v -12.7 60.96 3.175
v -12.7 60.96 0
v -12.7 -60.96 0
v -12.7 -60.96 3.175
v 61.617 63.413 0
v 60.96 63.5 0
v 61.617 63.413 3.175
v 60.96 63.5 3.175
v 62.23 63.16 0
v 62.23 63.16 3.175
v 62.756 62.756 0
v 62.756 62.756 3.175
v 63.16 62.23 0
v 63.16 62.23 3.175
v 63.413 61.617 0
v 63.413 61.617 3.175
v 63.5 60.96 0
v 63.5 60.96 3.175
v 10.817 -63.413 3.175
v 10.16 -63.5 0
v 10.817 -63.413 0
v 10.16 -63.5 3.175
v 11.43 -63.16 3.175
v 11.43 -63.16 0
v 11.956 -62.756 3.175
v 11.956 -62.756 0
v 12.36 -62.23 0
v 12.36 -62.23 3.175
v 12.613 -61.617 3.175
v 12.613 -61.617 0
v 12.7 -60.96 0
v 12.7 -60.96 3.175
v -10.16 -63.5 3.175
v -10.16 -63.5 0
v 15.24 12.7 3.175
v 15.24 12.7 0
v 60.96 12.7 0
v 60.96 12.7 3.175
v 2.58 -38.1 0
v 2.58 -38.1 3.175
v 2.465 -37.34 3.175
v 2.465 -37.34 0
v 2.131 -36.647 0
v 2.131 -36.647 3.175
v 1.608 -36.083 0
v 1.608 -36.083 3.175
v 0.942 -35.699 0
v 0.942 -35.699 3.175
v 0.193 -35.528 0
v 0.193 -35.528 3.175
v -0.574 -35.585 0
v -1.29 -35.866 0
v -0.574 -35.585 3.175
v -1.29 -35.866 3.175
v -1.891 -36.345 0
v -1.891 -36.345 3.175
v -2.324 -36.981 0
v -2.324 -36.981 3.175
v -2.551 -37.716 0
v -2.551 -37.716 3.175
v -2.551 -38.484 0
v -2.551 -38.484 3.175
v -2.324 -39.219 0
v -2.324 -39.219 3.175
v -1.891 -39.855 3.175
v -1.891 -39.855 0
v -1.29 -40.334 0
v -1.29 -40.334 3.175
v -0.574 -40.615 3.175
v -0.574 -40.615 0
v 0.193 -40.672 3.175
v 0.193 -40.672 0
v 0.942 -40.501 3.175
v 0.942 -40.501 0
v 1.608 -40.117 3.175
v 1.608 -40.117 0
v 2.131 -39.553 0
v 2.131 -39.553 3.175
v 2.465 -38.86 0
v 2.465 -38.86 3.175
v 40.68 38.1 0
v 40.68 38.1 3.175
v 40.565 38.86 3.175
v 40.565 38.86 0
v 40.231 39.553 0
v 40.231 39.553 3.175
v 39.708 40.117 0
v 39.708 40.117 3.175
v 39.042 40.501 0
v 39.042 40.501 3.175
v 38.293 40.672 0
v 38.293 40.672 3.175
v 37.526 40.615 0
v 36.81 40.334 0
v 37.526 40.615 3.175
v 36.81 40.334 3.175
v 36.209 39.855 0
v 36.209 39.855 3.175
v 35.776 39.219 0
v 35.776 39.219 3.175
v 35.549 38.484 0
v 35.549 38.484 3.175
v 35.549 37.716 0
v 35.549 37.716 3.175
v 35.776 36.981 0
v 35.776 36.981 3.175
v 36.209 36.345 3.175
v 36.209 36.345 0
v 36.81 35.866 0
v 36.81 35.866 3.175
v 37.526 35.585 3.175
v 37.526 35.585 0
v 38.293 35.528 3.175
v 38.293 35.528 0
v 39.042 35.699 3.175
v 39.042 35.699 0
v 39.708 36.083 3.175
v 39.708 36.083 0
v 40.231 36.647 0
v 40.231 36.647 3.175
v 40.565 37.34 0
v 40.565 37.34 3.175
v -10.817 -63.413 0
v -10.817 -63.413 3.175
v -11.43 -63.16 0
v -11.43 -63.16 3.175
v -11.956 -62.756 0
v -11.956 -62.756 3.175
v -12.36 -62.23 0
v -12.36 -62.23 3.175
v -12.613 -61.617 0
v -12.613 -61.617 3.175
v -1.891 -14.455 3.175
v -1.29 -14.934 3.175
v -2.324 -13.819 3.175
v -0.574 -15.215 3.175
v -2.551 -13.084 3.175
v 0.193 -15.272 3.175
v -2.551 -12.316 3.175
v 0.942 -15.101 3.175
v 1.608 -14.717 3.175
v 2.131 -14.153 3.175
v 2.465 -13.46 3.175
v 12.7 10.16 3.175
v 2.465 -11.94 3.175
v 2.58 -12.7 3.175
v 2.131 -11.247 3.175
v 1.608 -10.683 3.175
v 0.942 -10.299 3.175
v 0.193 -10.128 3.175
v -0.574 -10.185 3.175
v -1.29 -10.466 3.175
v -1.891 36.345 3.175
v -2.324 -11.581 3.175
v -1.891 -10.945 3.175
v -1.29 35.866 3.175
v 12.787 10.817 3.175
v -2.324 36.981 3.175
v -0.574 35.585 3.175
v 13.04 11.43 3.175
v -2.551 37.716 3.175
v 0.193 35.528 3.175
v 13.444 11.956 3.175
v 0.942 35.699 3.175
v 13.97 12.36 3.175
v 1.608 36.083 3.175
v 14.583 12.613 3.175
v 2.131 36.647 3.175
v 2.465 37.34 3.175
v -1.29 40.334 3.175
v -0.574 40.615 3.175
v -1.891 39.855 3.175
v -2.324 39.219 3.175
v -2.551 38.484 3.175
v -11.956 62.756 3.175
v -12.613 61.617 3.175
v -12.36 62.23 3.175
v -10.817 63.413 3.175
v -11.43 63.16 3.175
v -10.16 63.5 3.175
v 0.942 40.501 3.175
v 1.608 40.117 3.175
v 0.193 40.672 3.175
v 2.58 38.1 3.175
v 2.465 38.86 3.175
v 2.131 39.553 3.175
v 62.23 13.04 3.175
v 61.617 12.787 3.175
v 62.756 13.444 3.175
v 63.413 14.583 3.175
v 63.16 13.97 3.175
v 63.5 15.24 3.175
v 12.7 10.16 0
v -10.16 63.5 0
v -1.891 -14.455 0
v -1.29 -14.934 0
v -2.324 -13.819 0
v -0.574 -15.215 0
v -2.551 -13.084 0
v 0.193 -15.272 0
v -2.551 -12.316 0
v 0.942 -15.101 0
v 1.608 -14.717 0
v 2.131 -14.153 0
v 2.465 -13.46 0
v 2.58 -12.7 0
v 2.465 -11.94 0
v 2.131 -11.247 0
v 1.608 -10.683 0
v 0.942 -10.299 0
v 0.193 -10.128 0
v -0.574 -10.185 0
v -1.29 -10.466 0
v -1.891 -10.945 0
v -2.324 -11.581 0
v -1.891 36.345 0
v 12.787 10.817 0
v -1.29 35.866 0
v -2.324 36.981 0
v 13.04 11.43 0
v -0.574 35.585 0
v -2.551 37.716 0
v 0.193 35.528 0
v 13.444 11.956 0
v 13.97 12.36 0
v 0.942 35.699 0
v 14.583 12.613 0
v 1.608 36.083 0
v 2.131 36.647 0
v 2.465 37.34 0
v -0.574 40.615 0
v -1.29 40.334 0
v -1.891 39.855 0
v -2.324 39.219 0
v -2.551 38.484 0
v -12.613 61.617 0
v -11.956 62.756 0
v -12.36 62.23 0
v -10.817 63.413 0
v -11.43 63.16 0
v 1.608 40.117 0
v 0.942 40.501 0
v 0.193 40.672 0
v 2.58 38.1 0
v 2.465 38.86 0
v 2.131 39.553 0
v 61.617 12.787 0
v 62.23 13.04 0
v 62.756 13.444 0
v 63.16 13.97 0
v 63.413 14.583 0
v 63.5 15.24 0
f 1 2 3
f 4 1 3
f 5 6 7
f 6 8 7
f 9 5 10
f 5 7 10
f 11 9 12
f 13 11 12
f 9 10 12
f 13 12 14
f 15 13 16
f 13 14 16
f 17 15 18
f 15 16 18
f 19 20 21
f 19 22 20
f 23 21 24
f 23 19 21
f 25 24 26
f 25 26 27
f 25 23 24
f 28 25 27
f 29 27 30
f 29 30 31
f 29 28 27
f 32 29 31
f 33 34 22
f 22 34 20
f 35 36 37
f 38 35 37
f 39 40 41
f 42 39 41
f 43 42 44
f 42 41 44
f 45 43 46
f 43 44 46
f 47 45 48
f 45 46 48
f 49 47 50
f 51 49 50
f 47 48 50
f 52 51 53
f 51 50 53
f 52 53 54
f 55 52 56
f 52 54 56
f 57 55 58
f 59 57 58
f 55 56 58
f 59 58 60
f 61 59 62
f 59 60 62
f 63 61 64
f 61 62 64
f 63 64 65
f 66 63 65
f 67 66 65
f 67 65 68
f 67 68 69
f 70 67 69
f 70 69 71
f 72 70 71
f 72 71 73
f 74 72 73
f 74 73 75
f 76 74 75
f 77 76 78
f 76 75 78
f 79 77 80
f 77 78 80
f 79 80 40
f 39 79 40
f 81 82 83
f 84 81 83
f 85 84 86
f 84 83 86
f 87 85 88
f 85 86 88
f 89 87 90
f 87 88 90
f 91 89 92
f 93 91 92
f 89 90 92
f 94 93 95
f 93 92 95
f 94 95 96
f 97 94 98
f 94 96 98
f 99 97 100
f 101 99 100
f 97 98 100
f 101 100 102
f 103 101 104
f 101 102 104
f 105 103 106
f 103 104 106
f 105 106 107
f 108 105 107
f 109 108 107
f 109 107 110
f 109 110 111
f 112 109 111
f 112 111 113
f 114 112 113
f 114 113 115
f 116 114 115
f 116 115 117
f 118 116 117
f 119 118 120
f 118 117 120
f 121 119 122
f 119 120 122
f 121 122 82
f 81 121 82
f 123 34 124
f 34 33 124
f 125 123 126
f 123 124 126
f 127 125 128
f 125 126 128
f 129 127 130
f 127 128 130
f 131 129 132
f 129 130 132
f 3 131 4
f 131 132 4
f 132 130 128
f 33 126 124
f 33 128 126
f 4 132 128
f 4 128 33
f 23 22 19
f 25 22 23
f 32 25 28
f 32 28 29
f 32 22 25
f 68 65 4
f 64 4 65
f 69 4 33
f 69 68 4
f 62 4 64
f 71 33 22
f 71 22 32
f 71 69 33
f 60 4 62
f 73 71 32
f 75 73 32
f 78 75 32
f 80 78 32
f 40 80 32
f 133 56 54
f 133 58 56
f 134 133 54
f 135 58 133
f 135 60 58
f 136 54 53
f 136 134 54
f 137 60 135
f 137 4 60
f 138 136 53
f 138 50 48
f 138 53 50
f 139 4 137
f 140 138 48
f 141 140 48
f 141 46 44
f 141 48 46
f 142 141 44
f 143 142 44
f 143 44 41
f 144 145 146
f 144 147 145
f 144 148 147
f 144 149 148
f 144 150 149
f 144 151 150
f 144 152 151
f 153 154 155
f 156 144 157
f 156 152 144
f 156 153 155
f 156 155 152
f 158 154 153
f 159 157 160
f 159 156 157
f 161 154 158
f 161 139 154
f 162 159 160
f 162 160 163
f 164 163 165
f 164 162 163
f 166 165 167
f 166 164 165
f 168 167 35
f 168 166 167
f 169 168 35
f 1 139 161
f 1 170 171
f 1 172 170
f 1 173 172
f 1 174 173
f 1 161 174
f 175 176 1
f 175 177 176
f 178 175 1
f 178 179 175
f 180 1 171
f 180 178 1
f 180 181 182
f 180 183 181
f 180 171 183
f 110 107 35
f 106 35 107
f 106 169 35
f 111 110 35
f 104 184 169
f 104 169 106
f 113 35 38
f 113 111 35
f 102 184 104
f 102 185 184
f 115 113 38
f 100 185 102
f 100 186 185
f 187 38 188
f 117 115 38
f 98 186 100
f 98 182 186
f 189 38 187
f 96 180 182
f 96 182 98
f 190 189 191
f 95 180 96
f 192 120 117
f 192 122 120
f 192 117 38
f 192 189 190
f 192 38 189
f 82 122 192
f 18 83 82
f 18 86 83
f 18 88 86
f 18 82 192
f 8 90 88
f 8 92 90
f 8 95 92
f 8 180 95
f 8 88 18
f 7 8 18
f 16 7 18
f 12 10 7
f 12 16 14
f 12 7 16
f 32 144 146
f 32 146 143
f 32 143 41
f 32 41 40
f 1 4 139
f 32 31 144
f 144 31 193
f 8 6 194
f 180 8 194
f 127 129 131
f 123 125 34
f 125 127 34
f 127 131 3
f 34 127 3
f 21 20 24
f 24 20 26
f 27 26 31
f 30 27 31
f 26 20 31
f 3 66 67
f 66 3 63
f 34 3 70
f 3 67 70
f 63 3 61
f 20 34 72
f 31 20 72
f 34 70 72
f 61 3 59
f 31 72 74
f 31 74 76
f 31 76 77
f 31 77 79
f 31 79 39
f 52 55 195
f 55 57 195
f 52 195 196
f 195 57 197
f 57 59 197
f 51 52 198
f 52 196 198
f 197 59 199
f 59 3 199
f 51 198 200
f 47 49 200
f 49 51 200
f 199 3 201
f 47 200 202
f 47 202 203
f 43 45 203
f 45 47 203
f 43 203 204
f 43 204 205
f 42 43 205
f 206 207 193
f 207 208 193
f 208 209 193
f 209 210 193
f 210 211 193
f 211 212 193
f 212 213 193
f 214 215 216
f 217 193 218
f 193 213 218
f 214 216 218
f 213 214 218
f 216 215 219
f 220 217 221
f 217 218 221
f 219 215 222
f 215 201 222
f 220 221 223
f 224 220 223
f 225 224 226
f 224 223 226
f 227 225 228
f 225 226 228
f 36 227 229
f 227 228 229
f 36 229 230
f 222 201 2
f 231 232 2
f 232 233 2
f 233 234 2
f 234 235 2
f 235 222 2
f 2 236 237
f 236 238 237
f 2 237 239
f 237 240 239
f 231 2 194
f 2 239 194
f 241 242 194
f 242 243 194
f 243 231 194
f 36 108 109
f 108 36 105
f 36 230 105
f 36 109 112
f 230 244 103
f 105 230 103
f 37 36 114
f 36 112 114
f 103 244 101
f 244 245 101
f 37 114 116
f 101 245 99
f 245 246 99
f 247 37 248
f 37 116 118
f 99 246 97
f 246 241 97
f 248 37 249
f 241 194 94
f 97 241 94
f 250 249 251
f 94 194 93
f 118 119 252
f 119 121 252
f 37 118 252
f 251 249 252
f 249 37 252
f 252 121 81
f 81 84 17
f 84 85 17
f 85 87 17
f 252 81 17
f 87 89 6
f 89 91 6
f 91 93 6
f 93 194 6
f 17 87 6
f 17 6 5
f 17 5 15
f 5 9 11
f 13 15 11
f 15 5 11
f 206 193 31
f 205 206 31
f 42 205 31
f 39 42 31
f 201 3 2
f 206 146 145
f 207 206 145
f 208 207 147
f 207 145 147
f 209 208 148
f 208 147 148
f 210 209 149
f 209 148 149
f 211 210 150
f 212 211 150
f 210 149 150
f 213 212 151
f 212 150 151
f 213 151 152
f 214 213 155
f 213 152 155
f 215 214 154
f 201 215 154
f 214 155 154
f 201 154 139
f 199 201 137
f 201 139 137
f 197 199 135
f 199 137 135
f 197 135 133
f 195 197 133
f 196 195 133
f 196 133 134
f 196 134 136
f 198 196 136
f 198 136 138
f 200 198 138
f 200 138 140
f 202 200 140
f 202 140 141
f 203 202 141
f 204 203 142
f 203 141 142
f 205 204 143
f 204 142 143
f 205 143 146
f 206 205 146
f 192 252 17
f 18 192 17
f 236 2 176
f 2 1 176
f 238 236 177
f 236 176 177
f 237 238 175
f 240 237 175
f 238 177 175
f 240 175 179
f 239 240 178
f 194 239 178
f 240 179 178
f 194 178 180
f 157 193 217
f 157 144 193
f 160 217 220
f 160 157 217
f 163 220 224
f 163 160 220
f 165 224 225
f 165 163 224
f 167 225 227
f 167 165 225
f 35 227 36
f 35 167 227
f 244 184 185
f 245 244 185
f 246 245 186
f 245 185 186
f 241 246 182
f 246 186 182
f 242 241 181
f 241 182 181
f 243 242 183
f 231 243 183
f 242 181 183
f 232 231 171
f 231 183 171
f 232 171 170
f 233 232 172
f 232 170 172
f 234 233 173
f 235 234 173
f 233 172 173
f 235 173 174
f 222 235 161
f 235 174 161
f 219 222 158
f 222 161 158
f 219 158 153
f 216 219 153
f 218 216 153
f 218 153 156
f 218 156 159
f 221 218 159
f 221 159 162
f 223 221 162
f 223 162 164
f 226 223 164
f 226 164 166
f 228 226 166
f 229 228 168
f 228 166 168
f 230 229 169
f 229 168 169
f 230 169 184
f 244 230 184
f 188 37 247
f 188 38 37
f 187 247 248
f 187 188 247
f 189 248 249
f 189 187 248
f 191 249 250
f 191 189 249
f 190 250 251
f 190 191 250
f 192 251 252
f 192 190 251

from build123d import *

# Parameters (mm, degrees)
BOSS_EXTRUDE1_DEPTH = 3.175
SKETCH2_R           = 2.5796875
CUT_EXTRUDE1_DEPTH  = 3.175
FILLET1_R           = 2.54


with BuildPart() as part:
    # Sketch1 → Boss-Extrude1 (new body)
    with BuildSketch(Plane.XY):
        Polygon((-12.7, -63.5), (12.7, -63.5), (12.7, 12.7), (63.5, 12.7), (63.5, 63.5), (12.7, 63.5), (-12.7, 63.5), align=None)
    extrude(amount=BOSS_EXTRUDE1_DEPTH)

    # Sketch2 → Cut-Extrude1 (cut)
    with BuildSketch(Plane.XY.offset(3.175)):
        with Locations((0, 38.1)):
            Circle(SKETCH2_R)
        with Locations((38.1, 38.1)):
            Circle(SKETCH2_R)
        with Locations((0, -38.1)):
            Circle(SKETCH2_R)
        with Locations((0, -12.7)):
            Circle(SKETCH2_R)
    extrude(amount=-CUT_EXTRUDE1_DEPTH, mode=Mode.SUBTRACT)

    # Fillet1
    fillet1_edges = [part.edges().sort_by_distance(p)[0] for p in [
        (63.5, 63.5, 1.5875),
        (63.5, 12.7, 1.5875),
        (12.7, 12.7, 1.5875),
        (12.7, -63.5, 1.5875),
        (-12.7, -63.5, 1.5875),
        (-12.7, 63.5, 1.5875),
    ]]
    fillet(fillet1_edges, radius=FILLET1_R)


solid = part.part
